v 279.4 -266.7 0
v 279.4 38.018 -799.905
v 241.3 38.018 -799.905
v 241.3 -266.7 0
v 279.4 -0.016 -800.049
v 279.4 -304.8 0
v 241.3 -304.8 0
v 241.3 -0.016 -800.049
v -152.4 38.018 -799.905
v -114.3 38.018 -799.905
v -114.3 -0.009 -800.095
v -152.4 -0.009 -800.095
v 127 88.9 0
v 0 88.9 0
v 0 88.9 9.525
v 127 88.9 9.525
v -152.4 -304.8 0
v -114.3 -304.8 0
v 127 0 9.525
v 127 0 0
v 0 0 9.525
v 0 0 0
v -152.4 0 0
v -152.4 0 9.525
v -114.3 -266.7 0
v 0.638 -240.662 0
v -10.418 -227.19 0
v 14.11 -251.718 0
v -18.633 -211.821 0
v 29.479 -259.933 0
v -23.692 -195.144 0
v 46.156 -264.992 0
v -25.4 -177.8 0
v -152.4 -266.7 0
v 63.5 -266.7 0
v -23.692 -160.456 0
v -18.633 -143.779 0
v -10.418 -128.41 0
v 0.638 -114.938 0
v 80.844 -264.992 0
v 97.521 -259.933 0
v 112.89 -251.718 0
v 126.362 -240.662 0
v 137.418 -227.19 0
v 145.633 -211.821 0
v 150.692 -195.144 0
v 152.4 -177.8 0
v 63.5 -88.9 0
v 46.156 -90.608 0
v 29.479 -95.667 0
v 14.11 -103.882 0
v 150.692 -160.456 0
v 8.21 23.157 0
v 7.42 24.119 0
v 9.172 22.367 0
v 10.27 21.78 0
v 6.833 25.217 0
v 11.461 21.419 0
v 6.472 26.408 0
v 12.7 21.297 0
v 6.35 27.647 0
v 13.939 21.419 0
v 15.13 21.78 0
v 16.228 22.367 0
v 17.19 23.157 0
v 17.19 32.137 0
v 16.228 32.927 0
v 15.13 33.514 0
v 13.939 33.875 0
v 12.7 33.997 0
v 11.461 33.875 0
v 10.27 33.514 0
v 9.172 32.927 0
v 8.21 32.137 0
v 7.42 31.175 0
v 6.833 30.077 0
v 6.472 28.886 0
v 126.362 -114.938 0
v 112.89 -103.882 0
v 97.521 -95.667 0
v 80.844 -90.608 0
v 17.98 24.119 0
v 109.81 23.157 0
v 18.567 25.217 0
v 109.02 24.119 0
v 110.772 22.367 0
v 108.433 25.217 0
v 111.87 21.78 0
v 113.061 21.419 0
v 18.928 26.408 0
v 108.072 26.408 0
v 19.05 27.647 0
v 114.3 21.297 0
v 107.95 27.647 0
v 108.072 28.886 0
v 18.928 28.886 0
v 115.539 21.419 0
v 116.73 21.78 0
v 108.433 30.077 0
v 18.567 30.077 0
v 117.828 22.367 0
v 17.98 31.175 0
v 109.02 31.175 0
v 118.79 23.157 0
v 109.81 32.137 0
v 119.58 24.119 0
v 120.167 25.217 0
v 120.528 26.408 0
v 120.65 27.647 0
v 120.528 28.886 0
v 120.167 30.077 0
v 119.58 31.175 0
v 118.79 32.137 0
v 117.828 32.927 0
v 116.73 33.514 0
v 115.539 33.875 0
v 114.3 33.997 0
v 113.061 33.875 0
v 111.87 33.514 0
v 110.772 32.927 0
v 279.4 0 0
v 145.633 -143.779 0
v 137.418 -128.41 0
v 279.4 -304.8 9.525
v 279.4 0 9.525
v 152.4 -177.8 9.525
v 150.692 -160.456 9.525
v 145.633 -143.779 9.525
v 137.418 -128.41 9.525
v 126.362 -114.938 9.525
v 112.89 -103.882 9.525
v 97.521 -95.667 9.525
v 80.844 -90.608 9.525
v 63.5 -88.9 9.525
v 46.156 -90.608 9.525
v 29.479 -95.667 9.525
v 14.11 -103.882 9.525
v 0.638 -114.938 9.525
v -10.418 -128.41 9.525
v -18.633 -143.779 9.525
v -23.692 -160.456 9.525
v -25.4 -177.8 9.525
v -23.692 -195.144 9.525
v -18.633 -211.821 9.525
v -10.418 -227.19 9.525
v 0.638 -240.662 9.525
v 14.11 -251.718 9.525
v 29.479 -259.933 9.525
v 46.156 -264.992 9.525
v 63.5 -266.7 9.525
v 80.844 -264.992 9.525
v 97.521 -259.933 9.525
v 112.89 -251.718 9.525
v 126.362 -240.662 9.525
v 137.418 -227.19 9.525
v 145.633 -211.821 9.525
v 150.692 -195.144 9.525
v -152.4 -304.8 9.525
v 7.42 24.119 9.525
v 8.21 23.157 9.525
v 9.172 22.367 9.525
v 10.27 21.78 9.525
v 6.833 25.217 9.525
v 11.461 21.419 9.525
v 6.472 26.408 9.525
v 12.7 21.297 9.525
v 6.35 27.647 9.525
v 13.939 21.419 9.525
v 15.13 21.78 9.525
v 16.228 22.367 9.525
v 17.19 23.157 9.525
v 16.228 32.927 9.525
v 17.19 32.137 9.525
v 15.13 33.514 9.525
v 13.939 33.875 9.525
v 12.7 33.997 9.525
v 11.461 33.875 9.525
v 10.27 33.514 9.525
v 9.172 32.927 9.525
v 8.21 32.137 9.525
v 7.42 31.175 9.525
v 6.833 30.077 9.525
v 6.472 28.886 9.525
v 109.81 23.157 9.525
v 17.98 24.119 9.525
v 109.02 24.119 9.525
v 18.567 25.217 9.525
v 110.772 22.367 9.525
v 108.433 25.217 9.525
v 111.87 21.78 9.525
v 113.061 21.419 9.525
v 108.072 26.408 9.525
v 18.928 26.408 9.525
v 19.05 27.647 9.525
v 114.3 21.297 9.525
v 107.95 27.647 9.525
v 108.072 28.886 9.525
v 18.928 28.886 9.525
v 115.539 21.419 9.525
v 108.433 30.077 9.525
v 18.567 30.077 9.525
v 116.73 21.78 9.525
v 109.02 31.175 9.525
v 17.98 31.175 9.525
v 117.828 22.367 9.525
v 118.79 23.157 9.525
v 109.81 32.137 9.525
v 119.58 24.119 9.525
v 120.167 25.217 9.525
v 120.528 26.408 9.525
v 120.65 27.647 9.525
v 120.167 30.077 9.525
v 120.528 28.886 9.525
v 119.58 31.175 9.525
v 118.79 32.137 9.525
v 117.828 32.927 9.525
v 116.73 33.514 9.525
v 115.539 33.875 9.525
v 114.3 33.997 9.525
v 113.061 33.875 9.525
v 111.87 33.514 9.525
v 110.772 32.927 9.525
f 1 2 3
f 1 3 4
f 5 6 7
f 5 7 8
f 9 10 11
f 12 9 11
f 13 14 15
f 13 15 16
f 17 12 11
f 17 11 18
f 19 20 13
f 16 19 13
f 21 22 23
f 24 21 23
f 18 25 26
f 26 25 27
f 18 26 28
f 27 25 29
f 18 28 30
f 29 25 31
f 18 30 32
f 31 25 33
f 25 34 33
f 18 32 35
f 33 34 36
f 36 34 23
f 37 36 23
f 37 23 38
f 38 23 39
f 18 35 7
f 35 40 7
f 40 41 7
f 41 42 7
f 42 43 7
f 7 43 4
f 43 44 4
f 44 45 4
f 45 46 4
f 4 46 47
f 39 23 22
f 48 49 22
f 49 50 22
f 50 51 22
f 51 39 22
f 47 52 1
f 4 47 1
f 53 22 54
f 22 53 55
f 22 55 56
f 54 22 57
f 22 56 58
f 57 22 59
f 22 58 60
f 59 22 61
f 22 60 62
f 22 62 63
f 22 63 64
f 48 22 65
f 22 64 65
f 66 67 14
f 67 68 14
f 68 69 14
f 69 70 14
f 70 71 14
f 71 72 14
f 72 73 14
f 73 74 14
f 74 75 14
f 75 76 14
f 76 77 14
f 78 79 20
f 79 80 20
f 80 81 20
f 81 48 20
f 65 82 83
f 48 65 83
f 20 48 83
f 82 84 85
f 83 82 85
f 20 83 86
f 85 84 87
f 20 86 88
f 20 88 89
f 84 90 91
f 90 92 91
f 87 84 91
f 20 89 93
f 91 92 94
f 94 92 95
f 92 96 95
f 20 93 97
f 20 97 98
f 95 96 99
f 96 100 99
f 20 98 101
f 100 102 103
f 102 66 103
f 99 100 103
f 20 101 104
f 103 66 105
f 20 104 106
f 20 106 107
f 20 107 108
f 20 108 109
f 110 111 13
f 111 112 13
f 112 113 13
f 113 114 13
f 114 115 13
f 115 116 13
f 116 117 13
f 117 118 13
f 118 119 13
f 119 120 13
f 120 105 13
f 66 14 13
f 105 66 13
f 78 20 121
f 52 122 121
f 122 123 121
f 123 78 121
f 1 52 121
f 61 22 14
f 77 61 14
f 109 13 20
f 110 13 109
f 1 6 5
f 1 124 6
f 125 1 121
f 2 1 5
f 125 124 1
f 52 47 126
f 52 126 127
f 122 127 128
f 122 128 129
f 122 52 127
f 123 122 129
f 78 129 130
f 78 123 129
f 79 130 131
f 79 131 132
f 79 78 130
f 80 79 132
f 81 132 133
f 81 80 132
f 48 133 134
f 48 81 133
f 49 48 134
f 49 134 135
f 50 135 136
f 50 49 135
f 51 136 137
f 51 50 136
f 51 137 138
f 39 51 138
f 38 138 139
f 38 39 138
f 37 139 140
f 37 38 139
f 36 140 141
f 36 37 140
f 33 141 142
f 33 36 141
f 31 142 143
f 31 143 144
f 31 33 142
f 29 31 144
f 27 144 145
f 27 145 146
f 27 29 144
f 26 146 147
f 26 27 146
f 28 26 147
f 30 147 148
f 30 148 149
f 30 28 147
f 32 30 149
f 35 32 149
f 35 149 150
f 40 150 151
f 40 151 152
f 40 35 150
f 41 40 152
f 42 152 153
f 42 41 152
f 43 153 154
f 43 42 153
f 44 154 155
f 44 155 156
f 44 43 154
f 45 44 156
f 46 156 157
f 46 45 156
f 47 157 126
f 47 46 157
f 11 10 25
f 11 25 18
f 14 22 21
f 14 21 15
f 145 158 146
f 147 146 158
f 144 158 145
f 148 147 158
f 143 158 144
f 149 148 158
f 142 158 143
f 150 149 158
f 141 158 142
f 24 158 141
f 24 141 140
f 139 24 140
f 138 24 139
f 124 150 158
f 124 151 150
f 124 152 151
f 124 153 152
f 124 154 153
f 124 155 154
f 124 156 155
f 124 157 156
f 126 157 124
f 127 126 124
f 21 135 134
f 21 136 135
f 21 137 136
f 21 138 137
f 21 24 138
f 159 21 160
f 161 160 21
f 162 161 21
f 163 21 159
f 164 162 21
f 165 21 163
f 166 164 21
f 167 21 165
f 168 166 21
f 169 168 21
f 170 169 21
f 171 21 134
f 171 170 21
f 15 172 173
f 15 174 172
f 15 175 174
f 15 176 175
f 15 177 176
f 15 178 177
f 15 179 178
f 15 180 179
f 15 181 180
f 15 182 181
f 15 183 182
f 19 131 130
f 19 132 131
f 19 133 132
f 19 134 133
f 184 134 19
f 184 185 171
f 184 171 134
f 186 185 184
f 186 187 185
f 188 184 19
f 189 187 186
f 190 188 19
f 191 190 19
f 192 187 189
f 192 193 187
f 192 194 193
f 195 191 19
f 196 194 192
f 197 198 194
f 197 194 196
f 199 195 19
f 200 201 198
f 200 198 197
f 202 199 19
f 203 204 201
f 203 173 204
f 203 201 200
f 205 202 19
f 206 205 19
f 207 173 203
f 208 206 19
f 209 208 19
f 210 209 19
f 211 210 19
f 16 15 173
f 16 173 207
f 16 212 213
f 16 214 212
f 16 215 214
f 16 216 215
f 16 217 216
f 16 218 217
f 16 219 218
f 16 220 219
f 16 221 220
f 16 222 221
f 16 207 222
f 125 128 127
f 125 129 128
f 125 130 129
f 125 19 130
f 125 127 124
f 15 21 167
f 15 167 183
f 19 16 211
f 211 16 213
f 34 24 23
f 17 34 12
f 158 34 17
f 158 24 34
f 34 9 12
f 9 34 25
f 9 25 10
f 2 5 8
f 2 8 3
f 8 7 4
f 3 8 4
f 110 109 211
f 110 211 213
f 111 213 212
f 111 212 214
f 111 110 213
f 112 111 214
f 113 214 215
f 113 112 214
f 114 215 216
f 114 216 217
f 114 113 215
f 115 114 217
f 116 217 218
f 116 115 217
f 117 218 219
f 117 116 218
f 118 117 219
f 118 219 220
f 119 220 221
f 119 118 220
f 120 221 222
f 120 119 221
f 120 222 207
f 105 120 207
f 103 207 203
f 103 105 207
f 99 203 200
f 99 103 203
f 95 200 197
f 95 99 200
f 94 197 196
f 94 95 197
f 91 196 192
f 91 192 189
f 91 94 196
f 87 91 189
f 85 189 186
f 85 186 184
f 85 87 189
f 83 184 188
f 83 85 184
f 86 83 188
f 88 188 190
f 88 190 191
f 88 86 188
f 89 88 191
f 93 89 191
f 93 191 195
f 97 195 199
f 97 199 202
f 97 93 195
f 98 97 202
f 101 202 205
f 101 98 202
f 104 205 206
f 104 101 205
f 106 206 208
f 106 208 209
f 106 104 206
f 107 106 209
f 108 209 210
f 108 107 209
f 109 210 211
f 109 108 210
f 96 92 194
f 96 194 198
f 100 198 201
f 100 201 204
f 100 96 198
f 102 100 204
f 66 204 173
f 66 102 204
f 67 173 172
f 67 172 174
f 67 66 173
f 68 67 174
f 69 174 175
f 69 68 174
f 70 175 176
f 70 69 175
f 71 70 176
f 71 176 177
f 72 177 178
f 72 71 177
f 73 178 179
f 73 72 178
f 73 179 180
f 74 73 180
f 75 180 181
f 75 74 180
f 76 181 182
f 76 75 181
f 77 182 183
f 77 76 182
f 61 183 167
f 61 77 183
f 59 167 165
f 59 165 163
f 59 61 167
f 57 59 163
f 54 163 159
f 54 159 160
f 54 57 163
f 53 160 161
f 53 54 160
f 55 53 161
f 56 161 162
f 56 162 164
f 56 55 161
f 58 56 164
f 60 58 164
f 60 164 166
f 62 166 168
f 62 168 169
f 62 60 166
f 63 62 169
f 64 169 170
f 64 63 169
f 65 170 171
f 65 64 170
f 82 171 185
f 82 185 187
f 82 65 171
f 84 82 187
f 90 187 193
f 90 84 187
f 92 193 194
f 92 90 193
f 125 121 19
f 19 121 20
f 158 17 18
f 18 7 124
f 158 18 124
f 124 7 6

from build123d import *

# Parameters (mm, degrees)
F0_W     = 127
F0_H     = 88.9
F0_R     = 6.35
F0_R_2   = 88.9
F1_DEPTH = 9.525
F3_DEPTH = 38.1
F5_DEPTH = 38.1


with BuildPart() as f1:
    # F0 (on Top) → F1 (new body)
    with BuildSketch(Plane.XY):
        with Locations((63.5, 44.45)):
            Rectangle(F0_W, F0_H)
        with Locations((12.7, 27.647039)):
            Circle(F0_R, mode=Mode.SUBTRACT)
        with Locations((114.3, 27.647039)):
            Circle(F0_R, mode=Mode.SUBTRACT)
        Polygon((127, 0), (0, 0), (-152.4, 0), (-152.4, -304.8), (279.4, -304.8), (279.4, 0), align=None)
        with Locations((63.5, -177.8)):
            Circle(F0_R_2, mode=Mode.SUBTRACT)
    extrude(amount=F1_DEPTH)

    # F2 (on face) → F3 (join)
    with BuildSketch(Plane(origin=(-152.4, 0, 0), x_dir=(0, -1, 0), z_dir=(-1, 0, 0))):
        Polygon((0.009177, -800.095136), (304.8, 0), (266.7, 0), (-38.018486, -799.905247), align=None)
    extrude(amount=-F3_DEPTH)

    # F4 (on face) → F5 (join)
    with BuildSketch(Plane.YZ.offset(279.4)):
        Polygon((-266.7, 0), (-304.8, 0), (-0.016334, -800.048764), (38.018486, -799.905247), align=None)
    extrude(amount=-F5_DEPTH)


solid = f1.part
